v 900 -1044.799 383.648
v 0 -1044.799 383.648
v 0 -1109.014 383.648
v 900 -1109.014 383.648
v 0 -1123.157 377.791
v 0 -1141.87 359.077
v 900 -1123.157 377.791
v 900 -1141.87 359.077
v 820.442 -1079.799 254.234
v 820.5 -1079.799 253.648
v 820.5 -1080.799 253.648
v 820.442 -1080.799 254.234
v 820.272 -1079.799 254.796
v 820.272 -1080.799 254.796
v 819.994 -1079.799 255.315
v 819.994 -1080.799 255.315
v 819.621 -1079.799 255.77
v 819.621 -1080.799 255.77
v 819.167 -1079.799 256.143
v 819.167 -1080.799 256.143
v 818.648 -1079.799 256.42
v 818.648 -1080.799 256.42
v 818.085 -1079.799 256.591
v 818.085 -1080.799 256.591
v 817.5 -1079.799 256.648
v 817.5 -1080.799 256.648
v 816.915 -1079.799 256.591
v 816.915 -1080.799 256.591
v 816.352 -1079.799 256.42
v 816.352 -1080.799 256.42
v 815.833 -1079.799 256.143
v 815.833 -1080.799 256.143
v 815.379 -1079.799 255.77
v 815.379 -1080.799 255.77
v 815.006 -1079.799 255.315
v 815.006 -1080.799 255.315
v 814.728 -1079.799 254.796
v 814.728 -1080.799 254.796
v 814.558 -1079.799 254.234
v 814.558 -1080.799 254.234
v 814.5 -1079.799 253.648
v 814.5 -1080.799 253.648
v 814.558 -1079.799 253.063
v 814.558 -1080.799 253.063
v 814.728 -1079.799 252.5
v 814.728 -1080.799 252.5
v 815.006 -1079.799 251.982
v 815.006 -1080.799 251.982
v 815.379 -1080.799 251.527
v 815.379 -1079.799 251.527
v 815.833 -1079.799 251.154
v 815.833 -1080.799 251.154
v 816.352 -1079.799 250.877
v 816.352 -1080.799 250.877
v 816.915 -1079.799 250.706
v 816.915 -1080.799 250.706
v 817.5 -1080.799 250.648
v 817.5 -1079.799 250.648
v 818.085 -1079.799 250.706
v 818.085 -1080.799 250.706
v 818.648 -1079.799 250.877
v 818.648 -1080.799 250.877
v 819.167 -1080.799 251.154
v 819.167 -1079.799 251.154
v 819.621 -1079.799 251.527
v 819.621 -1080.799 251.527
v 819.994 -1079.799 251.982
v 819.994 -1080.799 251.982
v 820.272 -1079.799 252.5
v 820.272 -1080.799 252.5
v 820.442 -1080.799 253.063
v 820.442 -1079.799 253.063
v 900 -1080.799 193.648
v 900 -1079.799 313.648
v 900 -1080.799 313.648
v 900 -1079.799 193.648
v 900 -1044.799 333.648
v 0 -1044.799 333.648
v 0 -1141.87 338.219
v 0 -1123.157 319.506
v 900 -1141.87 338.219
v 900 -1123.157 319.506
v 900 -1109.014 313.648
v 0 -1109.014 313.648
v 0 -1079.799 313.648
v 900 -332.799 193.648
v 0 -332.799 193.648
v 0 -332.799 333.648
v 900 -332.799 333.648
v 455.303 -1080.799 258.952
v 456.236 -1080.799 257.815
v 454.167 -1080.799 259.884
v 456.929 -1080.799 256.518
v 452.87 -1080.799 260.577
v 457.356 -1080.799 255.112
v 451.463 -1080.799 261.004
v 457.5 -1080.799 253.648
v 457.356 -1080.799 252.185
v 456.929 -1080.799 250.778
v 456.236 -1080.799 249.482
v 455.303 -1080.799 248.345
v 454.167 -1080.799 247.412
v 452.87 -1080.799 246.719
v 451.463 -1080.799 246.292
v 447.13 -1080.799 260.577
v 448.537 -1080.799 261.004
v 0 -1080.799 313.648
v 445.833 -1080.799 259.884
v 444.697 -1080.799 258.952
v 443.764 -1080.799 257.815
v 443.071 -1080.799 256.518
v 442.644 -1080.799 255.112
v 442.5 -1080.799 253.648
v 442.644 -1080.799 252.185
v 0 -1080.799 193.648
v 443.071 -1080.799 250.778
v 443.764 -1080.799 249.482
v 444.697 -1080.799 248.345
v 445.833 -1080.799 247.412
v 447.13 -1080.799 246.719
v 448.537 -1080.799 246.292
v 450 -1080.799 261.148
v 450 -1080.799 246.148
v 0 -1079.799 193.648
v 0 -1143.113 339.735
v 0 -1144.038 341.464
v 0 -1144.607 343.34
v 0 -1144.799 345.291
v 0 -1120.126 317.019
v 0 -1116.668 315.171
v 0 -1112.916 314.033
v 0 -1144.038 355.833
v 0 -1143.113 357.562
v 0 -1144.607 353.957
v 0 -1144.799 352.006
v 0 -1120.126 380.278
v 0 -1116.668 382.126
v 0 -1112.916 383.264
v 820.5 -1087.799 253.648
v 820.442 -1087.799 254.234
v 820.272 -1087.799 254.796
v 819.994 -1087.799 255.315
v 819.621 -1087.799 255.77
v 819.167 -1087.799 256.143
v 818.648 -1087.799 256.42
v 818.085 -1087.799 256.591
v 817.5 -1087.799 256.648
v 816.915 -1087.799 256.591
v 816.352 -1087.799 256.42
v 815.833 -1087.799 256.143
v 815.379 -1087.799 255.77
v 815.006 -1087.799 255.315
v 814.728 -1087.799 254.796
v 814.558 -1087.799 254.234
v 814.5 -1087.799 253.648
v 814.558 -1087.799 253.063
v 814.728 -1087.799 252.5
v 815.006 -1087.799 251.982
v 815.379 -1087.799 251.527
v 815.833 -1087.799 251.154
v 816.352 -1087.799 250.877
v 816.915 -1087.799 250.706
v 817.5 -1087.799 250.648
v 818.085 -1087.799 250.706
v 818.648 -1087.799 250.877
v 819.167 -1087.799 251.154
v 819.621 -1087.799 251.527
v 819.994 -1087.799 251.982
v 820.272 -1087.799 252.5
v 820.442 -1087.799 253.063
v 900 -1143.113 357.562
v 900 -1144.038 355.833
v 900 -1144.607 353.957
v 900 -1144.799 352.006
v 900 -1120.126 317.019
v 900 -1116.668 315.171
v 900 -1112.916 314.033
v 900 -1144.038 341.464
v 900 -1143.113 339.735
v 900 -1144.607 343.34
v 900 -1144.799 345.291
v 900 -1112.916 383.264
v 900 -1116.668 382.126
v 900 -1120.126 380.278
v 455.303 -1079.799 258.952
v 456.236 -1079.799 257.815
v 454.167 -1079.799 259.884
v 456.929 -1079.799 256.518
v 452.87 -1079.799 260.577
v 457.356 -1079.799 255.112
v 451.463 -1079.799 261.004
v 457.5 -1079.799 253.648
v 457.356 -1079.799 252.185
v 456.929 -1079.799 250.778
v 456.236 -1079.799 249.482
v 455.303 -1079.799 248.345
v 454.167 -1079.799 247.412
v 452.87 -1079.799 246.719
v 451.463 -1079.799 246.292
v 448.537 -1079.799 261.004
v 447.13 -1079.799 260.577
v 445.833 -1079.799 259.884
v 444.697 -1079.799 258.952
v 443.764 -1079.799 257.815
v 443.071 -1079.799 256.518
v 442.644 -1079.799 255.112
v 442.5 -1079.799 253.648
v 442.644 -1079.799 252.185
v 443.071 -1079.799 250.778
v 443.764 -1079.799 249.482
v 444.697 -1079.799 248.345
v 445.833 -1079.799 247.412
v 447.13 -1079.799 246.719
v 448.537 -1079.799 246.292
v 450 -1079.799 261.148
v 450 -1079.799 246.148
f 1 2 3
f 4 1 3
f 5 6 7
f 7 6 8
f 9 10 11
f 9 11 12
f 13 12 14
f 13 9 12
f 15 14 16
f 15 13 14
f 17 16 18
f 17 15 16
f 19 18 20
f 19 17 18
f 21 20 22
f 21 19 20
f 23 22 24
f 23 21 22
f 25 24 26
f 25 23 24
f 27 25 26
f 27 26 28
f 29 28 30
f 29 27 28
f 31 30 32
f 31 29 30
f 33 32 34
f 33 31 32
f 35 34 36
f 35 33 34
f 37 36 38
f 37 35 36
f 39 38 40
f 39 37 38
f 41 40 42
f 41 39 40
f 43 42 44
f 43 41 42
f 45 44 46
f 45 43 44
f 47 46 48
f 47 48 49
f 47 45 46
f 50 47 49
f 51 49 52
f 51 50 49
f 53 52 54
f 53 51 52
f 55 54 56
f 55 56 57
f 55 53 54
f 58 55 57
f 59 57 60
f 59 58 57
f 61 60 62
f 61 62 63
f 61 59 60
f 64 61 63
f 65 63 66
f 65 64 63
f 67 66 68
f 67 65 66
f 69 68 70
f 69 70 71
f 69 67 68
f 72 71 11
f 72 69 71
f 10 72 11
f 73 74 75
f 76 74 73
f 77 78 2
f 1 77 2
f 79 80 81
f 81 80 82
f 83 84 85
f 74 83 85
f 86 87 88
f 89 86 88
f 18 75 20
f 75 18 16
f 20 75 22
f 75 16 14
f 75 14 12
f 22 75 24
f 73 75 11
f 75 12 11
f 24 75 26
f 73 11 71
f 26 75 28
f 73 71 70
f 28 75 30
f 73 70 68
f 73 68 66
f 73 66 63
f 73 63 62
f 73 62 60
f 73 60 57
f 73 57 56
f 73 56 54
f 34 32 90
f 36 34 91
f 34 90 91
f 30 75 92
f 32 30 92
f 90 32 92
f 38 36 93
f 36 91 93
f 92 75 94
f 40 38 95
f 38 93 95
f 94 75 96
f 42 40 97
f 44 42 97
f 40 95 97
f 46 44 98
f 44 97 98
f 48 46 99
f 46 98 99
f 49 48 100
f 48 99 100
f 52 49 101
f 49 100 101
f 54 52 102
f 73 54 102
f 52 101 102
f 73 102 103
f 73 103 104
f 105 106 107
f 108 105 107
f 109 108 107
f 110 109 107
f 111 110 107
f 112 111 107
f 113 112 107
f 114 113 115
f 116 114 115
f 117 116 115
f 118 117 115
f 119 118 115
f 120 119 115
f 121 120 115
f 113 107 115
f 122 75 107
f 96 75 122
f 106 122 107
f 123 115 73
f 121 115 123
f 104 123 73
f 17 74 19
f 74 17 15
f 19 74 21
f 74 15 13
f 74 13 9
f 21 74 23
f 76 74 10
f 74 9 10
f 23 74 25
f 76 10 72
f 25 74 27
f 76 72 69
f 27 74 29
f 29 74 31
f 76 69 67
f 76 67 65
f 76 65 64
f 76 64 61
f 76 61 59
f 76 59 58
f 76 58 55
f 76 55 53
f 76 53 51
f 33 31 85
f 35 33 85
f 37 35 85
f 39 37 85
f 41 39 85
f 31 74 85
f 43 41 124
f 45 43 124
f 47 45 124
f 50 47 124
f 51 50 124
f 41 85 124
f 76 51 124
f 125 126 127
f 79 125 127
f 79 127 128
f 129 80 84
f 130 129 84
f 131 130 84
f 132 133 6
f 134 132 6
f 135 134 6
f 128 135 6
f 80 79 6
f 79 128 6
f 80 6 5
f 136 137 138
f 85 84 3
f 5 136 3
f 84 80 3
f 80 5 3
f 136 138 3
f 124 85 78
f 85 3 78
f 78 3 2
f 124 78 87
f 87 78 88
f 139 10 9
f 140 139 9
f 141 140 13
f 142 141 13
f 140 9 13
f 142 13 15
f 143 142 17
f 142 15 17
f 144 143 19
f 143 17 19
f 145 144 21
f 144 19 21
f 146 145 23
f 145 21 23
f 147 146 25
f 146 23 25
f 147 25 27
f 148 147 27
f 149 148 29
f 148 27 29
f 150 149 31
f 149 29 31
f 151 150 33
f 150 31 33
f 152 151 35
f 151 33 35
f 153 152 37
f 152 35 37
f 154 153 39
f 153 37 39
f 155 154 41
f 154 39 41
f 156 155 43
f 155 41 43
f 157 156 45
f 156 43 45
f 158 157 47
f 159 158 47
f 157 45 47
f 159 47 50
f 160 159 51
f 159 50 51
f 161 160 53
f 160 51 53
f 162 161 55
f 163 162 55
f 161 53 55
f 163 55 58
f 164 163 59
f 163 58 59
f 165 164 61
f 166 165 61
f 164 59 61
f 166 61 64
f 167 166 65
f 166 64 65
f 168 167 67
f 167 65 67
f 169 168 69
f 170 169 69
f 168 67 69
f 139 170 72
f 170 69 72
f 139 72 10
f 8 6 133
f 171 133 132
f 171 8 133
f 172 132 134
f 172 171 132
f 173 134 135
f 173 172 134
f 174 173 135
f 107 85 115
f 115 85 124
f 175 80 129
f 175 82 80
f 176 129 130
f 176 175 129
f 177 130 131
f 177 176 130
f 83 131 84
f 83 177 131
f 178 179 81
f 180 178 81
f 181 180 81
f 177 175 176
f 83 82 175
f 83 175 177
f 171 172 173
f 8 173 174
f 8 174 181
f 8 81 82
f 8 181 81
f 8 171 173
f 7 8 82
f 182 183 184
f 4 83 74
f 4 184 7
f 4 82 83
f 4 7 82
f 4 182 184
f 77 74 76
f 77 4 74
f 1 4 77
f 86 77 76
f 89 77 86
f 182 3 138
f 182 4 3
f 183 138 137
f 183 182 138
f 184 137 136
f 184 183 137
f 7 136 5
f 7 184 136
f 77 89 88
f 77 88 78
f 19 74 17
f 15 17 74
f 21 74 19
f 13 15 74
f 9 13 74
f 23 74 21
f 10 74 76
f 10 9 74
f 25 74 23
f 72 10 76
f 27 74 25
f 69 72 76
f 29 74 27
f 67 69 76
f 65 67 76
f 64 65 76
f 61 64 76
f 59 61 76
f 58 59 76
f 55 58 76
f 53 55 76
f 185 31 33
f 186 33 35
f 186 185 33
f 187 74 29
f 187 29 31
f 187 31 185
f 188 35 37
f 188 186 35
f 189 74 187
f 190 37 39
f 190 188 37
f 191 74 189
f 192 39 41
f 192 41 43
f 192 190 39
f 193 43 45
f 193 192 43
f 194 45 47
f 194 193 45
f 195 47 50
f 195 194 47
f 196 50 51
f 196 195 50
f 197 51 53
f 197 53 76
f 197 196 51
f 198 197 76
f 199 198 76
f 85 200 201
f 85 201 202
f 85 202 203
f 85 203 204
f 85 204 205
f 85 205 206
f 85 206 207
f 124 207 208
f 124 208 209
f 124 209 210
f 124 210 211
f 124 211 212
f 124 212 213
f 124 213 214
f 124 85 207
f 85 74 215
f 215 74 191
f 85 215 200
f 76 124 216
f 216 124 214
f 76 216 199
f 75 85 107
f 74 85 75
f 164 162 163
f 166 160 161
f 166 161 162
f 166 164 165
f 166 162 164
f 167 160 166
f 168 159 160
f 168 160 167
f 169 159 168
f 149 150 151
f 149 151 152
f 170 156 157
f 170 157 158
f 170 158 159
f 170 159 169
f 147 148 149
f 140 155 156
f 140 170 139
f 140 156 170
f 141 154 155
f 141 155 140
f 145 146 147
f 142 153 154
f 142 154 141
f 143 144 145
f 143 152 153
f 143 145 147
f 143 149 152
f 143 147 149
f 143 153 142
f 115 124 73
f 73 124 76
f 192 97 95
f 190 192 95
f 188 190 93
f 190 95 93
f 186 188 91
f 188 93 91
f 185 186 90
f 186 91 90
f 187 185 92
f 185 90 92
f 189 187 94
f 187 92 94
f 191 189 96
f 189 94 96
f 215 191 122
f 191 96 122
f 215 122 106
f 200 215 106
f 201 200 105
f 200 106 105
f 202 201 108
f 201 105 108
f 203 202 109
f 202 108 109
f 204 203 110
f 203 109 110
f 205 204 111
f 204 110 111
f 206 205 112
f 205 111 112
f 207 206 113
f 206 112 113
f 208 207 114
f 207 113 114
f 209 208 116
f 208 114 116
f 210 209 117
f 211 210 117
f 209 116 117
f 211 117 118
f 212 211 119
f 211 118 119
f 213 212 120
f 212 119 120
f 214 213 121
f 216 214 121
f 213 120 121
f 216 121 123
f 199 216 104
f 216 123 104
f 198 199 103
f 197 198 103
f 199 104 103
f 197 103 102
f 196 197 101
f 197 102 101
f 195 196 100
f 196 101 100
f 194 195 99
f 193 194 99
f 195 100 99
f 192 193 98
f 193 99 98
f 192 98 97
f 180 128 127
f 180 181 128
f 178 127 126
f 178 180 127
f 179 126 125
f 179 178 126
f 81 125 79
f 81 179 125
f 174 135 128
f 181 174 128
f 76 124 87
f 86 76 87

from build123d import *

# Parameters (mm, degrees)
F1_DEPTH = 900
F2_SIZE  = 27.5
F3_R     = 20
F4_R     = 10
F5_R     = 3
F6_DEPTH = 8
F7_DEPTH = 1
F8_R     = 7.5
F9_DEPTH = 1


with BuildPart() as f1:
    # F0 (on Right) → F1 (new body)
    with BuildSketch(Plane.YZ):
        Polygon((-332.7987321251, 333.6483673438), (-402.7987321251, 333.6483673438), (-1044.7987321251, 333.6483673438), (-1044.7987321251, 383.6483673438), (-1144.7987321251, 383.6483673438), (-1144.7987321251, 313.6483673438), (-1079.7987321251, 313.6483673438), (-1079.7987321251, 193.6483673438), (-1029.7987321251, 193.6483673438), (-332.7987321251, 193.6483673438), align=None)
    extrude(amount=F1_DEPTH)

    # F2
    f2_edges = [f1.edges().sort_by_distance(p)[0] for p in [
        (450, -1144.798732, 383.648367),
        (450, -1144.798732, 313.648367),
    ]]
    chamfer(f2_edges, length=F2_SIZE)

    # F3
    f3_edges = [f1.edges().sort_by_distance(p)[0] for p in [
        (450, -1117.298732, 383.648367),
        (450, -1117.298732, 313.648367),
    ]]
    fillet(f3_edges, radius=F3_R)

    # F4
    f4_edges = [f1.edges().sort_by_distance(p)[0] for p in [
        (450, -1144.798732, 356.148367),
        (450, -1144.798732, 341.148367),
    ]]
    fillet(f4_edges, radius=F4_R)

    # F5 (on face) → F6 (join)
    with BuildSketch(Plane.XZ.offset(1079.7987321251)):
        with Locations((817.5, 253.6483673438)):
            Circle(F5_R)
    extrude(amount=F6_DEPTH)


with BuildPart() as f7:
    # F7 (new): a face of the model
    f7_faces = [f1.part.faces().sort_by_distance(p)[0] for p in [
        (449.9037635303, -1079.7987321251, 253.6483673438),
    ]]
    extrude(f7_faces, amount=F7_DEPTH)

    # F8 (on face) → F9 (cut)
    with BuildSketch(Plane.XZ.offset(1080.7987321251)):
        with Locations((450, 253.6483673438)):
            Circle(F8_R)
    extrude(amount=-F9_DEPTH, mode=Mode.SUBTRACT)


solid = Compound([f1.part, f7.part])
